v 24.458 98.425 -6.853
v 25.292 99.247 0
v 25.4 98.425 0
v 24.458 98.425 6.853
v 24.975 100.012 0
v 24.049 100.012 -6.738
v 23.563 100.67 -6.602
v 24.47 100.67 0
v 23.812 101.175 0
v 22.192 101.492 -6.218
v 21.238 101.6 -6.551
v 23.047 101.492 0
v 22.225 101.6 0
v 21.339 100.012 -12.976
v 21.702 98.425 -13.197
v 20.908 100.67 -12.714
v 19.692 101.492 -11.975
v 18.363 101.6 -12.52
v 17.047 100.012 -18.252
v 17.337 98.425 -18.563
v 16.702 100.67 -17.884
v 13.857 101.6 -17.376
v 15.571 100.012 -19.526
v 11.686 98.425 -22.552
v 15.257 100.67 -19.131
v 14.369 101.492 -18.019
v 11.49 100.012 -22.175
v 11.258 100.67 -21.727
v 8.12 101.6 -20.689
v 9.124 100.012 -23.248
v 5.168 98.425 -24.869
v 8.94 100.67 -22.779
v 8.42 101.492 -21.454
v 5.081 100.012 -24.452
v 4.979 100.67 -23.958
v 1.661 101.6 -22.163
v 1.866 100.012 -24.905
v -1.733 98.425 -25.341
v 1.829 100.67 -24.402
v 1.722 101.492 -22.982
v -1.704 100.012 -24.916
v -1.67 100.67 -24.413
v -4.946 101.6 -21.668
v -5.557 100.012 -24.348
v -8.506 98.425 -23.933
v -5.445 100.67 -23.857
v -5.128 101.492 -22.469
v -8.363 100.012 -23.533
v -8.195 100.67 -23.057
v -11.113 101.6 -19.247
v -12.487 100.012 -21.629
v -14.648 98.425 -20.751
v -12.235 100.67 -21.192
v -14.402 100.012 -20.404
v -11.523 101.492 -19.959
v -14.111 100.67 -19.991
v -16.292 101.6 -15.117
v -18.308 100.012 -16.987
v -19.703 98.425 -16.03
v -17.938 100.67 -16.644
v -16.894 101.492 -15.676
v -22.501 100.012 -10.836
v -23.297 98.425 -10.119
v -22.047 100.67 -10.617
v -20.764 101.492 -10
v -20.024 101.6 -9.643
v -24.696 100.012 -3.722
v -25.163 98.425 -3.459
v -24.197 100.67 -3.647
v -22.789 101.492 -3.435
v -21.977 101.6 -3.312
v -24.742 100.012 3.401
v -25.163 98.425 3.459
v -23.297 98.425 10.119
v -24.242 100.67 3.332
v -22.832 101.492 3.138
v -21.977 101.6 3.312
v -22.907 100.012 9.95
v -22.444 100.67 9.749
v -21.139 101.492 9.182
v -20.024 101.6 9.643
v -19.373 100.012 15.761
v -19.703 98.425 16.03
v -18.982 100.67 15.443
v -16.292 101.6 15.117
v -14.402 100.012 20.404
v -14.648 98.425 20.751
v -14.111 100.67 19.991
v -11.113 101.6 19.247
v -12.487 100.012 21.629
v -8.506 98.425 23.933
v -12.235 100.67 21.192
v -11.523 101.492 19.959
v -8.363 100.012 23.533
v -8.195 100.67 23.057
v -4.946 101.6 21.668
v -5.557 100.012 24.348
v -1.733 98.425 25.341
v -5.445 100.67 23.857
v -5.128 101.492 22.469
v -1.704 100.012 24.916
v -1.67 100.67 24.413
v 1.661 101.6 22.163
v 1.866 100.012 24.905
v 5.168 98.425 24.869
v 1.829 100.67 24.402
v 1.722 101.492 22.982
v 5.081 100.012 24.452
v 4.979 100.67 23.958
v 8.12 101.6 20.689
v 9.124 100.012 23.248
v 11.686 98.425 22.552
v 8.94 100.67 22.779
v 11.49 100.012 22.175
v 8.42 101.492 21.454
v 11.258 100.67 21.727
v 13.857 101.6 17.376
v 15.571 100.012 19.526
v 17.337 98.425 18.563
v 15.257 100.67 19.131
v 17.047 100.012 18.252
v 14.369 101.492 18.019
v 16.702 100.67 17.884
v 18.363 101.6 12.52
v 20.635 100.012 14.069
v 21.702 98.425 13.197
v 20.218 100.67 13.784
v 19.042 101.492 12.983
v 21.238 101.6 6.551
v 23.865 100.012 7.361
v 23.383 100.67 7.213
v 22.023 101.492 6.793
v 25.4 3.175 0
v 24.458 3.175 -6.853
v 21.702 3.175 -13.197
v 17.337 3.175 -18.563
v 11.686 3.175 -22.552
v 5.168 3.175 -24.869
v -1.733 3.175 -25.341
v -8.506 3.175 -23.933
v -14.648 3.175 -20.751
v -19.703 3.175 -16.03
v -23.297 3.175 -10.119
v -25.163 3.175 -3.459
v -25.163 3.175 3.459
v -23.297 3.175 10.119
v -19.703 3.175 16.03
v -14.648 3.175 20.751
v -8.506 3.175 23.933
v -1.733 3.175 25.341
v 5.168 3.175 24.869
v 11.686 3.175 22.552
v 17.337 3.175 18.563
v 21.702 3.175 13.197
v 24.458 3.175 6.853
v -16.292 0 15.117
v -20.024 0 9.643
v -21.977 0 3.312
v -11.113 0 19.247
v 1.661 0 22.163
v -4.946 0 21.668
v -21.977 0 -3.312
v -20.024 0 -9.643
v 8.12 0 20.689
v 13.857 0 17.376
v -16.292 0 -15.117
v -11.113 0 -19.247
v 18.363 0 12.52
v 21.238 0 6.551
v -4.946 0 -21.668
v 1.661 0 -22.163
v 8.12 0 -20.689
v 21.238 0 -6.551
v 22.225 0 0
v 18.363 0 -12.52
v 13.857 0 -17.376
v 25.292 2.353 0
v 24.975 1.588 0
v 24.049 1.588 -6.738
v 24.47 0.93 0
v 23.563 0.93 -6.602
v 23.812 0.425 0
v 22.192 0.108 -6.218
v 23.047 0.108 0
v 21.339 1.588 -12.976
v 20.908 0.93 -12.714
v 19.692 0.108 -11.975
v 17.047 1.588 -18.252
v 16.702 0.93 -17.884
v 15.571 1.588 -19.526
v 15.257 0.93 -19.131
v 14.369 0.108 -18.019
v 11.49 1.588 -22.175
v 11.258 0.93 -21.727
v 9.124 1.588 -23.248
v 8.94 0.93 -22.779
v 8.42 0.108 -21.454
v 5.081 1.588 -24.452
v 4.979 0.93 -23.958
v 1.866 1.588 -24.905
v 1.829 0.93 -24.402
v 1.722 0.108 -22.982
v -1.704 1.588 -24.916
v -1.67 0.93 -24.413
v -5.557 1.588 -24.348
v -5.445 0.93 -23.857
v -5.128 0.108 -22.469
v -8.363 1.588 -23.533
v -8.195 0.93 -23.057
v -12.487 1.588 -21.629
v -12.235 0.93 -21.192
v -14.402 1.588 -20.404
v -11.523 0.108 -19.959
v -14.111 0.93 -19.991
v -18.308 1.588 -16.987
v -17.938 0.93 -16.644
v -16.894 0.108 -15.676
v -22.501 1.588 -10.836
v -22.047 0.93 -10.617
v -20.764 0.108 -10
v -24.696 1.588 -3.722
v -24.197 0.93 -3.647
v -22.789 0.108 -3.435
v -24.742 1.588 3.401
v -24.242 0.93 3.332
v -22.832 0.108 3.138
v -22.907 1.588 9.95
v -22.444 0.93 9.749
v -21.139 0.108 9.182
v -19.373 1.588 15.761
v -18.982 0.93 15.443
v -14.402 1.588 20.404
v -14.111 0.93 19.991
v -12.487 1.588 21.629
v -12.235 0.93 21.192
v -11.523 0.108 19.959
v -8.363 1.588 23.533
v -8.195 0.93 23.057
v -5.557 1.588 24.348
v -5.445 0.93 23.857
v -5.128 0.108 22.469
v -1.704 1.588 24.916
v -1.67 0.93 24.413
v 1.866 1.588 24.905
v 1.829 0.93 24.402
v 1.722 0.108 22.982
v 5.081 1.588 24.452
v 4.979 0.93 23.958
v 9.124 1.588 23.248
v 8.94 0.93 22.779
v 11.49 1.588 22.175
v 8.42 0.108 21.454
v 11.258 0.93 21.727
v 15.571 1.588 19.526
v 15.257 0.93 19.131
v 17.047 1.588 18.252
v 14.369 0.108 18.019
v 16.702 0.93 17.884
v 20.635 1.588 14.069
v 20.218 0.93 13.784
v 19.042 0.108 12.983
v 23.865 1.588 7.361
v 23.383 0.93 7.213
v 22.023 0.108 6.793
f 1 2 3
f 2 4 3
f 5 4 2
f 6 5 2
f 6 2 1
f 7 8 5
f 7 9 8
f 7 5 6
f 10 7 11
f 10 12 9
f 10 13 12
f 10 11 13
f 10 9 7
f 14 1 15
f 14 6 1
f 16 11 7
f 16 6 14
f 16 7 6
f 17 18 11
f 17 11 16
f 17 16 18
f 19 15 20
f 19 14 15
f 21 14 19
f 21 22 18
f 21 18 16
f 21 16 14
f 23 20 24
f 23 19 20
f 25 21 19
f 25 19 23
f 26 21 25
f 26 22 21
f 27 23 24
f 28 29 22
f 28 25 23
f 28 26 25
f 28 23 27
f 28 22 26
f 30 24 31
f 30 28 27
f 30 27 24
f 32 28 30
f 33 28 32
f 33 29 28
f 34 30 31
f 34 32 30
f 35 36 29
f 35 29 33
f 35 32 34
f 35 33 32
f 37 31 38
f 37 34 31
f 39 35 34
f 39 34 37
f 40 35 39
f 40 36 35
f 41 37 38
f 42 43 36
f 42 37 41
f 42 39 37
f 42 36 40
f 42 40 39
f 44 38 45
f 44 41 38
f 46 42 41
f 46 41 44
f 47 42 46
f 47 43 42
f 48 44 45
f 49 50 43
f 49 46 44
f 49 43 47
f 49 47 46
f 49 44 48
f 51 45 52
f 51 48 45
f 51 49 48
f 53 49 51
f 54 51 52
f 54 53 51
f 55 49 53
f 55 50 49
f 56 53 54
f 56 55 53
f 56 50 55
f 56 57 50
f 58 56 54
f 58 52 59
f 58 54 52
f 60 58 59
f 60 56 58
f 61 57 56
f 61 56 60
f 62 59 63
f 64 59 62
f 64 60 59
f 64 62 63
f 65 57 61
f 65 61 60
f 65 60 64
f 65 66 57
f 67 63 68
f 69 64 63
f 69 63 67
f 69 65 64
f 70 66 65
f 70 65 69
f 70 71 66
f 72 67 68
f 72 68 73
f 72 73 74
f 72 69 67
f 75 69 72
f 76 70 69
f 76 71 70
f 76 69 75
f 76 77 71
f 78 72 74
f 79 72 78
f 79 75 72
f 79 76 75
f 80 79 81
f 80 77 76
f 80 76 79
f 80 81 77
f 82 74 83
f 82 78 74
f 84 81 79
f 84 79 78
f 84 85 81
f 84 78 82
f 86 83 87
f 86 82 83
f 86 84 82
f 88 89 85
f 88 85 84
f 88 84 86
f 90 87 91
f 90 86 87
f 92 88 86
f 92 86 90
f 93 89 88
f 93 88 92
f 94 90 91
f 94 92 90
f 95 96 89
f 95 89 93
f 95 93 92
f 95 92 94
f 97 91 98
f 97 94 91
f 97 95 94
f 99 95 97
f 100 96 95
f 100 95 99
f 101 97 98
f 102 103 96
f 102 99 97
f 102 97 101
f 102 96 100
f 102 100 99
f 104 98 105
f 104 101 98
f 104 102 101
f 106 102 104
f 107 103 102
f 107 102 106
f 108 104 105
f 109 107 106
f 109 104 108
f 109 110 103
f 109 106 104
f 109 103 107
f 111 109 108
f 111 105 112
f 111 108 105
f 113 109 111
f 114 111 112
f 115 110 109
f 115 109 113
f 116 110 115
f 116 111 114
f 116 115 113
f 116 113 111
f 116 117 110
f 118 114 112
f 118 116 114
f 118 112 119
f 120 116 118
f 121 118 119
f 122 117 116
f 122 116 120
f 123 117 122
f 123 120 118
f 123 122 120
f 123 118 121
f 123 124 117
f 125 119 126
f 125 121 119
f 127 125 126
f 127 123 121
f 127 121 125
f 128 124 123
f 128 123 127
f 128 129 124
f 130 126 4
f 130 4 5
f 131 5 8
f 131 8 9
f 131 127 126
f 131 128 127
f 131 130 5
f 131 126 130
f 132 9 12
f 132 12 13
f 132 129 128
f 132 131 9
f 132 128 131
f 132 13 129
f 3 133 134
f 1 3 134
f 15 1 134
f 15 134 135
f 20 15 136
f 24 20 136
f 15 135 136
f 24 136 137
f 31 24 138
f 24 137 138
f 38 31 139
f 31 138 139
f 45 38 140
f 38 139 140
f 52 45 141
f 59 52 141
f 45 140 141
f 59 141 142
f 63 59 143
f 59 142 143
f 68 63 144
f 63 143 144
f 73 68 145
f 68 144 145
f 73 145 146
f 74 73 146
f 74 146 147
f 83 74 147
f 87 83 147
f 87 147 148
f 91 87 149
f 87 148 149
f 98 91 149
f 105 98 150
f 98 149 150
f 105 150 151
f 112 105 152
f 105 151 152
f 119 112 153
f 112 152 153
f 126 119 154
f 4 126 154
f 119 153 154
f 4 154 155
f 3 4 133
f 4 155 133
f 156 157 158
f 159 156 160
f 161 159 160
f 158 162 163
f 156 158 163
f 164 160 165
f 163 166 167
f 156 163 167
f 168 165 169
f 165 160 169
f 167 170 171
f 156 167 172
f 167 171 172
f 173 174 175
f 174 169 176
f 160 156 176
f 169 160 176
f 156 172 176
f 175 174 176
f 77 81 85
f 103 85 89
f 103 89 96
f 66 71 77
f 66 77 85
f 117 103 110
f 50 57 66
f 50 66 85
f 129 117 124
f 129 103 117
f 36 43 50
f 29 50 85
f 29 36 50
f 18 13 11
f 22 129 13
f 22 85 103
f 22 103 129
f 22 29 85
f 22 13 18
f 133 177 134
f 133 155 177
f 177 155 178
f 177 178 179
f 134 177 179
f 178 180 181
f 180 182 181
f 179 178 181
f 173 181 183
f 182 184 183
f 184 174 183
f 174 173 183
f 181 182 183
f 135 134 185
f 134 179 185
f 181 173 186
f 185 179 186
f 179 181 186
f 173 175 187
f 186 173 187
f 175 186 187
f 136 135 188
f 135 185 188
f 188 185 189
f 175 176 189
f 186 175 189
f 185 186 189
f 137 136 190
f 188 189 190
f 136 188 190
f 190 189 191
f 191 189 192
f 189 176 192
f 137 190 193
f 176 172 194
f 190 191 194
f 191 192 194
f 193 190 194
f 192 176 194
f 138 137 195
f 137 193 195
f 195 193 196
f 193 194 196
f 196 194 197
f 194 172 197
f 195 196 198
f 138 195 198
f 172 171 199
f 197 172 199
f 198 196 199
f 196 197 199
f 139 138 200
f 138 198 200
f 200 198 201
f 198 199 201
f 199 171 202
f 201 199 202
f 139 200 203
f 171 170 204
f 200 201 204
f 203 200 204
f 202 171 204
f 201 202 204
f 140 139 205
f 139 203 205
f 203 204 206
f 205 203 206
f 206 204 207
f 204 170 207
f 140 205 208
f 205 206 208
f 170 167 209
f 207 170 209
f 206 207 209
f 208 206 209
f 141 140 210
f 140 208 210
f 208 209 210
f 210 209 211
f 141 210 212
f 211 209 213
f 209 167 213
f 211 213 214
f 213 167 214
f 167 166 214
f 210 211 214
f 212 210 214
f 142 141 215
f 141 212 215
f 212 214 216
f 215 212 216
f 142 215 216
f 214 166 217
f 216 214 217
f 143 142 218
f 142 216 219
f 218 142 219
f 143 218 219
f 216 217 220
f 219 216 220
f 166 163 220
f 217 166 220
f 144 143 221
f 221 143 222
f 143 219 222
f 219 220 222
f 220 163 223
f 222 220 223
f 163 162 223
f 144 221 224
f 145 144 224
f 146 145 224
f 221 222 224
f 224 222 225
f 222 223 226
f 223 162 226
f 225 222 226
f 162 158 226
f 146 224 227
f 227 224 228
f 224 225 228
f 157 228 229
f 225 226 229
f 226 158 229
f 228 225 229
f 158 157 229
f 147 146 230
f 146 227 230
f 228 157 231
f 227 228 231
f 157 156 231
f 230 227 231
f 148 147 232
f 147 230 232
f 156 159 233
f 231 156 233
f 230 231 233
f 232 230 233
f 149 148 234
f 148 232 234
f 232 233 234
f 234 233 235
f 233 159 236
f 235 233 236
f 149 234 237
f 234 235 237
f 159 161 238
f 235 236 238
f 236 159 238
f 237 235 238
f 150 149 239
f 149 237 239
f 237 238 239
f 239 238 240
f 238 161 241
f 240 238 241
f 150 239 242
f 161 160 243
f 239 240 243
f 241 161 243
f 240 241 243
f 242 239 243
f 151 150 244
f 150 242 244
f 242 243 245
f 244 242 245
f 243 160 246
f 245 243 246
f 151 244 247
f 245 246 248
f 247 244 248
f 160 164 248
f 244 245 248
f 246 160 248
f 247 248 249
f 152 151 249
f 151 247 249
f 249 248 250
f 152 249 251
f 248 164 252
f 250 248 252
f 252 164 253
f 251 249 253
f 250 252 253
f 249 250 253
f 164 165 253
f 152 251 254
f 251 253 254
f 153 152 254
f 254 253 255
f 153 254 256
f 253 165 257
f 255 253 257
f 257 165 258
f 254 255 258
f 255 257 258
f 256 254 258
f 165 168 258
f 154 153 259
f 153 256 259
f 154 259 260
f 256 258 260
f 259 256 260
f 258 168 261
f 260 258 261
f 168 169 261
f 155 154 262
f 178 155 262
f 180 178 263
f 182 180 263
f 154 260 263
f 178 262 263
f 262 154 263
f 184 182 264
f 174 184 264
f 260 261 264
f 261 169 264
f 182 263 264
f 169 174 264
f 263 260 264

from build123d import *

# Parameters (mm, degrees)
SKETCH1_R           = 25.4
BOSS_EXTRUDE1_DEPTH = 101.6
FILLET1_R           = 3.175
FILLET2_R           = 3.175


with BuildPart() as part:
    # Sketch1 → Boss-Extrude1 (new body)
    with BuildSketch(Plane(origin=(0, 0, 0), x_dir=(1, 0, 0), z_dir=(0, 1, 0))):
        Circle(SKETCH1_R)
    extrude(amount=BOSS_EXTRUDE1_DEPTH)

    # Fillet1
    fillet1_edges = [part.edges().sort_by_distance(p)[0] for p in [
        (-25.4, 101.6, 0),
    ]]
    fillet(fillet1_edges, radius=FILLET1_R)

    # Fillet2
    fillet2_edges = [part.edges().sort_by_distance(p)[0] for p in [
        (-25.4, 0, 0),
    ]]
    fillet(fillet2_edges, radius=FILLET2_R)


solid = part.part
